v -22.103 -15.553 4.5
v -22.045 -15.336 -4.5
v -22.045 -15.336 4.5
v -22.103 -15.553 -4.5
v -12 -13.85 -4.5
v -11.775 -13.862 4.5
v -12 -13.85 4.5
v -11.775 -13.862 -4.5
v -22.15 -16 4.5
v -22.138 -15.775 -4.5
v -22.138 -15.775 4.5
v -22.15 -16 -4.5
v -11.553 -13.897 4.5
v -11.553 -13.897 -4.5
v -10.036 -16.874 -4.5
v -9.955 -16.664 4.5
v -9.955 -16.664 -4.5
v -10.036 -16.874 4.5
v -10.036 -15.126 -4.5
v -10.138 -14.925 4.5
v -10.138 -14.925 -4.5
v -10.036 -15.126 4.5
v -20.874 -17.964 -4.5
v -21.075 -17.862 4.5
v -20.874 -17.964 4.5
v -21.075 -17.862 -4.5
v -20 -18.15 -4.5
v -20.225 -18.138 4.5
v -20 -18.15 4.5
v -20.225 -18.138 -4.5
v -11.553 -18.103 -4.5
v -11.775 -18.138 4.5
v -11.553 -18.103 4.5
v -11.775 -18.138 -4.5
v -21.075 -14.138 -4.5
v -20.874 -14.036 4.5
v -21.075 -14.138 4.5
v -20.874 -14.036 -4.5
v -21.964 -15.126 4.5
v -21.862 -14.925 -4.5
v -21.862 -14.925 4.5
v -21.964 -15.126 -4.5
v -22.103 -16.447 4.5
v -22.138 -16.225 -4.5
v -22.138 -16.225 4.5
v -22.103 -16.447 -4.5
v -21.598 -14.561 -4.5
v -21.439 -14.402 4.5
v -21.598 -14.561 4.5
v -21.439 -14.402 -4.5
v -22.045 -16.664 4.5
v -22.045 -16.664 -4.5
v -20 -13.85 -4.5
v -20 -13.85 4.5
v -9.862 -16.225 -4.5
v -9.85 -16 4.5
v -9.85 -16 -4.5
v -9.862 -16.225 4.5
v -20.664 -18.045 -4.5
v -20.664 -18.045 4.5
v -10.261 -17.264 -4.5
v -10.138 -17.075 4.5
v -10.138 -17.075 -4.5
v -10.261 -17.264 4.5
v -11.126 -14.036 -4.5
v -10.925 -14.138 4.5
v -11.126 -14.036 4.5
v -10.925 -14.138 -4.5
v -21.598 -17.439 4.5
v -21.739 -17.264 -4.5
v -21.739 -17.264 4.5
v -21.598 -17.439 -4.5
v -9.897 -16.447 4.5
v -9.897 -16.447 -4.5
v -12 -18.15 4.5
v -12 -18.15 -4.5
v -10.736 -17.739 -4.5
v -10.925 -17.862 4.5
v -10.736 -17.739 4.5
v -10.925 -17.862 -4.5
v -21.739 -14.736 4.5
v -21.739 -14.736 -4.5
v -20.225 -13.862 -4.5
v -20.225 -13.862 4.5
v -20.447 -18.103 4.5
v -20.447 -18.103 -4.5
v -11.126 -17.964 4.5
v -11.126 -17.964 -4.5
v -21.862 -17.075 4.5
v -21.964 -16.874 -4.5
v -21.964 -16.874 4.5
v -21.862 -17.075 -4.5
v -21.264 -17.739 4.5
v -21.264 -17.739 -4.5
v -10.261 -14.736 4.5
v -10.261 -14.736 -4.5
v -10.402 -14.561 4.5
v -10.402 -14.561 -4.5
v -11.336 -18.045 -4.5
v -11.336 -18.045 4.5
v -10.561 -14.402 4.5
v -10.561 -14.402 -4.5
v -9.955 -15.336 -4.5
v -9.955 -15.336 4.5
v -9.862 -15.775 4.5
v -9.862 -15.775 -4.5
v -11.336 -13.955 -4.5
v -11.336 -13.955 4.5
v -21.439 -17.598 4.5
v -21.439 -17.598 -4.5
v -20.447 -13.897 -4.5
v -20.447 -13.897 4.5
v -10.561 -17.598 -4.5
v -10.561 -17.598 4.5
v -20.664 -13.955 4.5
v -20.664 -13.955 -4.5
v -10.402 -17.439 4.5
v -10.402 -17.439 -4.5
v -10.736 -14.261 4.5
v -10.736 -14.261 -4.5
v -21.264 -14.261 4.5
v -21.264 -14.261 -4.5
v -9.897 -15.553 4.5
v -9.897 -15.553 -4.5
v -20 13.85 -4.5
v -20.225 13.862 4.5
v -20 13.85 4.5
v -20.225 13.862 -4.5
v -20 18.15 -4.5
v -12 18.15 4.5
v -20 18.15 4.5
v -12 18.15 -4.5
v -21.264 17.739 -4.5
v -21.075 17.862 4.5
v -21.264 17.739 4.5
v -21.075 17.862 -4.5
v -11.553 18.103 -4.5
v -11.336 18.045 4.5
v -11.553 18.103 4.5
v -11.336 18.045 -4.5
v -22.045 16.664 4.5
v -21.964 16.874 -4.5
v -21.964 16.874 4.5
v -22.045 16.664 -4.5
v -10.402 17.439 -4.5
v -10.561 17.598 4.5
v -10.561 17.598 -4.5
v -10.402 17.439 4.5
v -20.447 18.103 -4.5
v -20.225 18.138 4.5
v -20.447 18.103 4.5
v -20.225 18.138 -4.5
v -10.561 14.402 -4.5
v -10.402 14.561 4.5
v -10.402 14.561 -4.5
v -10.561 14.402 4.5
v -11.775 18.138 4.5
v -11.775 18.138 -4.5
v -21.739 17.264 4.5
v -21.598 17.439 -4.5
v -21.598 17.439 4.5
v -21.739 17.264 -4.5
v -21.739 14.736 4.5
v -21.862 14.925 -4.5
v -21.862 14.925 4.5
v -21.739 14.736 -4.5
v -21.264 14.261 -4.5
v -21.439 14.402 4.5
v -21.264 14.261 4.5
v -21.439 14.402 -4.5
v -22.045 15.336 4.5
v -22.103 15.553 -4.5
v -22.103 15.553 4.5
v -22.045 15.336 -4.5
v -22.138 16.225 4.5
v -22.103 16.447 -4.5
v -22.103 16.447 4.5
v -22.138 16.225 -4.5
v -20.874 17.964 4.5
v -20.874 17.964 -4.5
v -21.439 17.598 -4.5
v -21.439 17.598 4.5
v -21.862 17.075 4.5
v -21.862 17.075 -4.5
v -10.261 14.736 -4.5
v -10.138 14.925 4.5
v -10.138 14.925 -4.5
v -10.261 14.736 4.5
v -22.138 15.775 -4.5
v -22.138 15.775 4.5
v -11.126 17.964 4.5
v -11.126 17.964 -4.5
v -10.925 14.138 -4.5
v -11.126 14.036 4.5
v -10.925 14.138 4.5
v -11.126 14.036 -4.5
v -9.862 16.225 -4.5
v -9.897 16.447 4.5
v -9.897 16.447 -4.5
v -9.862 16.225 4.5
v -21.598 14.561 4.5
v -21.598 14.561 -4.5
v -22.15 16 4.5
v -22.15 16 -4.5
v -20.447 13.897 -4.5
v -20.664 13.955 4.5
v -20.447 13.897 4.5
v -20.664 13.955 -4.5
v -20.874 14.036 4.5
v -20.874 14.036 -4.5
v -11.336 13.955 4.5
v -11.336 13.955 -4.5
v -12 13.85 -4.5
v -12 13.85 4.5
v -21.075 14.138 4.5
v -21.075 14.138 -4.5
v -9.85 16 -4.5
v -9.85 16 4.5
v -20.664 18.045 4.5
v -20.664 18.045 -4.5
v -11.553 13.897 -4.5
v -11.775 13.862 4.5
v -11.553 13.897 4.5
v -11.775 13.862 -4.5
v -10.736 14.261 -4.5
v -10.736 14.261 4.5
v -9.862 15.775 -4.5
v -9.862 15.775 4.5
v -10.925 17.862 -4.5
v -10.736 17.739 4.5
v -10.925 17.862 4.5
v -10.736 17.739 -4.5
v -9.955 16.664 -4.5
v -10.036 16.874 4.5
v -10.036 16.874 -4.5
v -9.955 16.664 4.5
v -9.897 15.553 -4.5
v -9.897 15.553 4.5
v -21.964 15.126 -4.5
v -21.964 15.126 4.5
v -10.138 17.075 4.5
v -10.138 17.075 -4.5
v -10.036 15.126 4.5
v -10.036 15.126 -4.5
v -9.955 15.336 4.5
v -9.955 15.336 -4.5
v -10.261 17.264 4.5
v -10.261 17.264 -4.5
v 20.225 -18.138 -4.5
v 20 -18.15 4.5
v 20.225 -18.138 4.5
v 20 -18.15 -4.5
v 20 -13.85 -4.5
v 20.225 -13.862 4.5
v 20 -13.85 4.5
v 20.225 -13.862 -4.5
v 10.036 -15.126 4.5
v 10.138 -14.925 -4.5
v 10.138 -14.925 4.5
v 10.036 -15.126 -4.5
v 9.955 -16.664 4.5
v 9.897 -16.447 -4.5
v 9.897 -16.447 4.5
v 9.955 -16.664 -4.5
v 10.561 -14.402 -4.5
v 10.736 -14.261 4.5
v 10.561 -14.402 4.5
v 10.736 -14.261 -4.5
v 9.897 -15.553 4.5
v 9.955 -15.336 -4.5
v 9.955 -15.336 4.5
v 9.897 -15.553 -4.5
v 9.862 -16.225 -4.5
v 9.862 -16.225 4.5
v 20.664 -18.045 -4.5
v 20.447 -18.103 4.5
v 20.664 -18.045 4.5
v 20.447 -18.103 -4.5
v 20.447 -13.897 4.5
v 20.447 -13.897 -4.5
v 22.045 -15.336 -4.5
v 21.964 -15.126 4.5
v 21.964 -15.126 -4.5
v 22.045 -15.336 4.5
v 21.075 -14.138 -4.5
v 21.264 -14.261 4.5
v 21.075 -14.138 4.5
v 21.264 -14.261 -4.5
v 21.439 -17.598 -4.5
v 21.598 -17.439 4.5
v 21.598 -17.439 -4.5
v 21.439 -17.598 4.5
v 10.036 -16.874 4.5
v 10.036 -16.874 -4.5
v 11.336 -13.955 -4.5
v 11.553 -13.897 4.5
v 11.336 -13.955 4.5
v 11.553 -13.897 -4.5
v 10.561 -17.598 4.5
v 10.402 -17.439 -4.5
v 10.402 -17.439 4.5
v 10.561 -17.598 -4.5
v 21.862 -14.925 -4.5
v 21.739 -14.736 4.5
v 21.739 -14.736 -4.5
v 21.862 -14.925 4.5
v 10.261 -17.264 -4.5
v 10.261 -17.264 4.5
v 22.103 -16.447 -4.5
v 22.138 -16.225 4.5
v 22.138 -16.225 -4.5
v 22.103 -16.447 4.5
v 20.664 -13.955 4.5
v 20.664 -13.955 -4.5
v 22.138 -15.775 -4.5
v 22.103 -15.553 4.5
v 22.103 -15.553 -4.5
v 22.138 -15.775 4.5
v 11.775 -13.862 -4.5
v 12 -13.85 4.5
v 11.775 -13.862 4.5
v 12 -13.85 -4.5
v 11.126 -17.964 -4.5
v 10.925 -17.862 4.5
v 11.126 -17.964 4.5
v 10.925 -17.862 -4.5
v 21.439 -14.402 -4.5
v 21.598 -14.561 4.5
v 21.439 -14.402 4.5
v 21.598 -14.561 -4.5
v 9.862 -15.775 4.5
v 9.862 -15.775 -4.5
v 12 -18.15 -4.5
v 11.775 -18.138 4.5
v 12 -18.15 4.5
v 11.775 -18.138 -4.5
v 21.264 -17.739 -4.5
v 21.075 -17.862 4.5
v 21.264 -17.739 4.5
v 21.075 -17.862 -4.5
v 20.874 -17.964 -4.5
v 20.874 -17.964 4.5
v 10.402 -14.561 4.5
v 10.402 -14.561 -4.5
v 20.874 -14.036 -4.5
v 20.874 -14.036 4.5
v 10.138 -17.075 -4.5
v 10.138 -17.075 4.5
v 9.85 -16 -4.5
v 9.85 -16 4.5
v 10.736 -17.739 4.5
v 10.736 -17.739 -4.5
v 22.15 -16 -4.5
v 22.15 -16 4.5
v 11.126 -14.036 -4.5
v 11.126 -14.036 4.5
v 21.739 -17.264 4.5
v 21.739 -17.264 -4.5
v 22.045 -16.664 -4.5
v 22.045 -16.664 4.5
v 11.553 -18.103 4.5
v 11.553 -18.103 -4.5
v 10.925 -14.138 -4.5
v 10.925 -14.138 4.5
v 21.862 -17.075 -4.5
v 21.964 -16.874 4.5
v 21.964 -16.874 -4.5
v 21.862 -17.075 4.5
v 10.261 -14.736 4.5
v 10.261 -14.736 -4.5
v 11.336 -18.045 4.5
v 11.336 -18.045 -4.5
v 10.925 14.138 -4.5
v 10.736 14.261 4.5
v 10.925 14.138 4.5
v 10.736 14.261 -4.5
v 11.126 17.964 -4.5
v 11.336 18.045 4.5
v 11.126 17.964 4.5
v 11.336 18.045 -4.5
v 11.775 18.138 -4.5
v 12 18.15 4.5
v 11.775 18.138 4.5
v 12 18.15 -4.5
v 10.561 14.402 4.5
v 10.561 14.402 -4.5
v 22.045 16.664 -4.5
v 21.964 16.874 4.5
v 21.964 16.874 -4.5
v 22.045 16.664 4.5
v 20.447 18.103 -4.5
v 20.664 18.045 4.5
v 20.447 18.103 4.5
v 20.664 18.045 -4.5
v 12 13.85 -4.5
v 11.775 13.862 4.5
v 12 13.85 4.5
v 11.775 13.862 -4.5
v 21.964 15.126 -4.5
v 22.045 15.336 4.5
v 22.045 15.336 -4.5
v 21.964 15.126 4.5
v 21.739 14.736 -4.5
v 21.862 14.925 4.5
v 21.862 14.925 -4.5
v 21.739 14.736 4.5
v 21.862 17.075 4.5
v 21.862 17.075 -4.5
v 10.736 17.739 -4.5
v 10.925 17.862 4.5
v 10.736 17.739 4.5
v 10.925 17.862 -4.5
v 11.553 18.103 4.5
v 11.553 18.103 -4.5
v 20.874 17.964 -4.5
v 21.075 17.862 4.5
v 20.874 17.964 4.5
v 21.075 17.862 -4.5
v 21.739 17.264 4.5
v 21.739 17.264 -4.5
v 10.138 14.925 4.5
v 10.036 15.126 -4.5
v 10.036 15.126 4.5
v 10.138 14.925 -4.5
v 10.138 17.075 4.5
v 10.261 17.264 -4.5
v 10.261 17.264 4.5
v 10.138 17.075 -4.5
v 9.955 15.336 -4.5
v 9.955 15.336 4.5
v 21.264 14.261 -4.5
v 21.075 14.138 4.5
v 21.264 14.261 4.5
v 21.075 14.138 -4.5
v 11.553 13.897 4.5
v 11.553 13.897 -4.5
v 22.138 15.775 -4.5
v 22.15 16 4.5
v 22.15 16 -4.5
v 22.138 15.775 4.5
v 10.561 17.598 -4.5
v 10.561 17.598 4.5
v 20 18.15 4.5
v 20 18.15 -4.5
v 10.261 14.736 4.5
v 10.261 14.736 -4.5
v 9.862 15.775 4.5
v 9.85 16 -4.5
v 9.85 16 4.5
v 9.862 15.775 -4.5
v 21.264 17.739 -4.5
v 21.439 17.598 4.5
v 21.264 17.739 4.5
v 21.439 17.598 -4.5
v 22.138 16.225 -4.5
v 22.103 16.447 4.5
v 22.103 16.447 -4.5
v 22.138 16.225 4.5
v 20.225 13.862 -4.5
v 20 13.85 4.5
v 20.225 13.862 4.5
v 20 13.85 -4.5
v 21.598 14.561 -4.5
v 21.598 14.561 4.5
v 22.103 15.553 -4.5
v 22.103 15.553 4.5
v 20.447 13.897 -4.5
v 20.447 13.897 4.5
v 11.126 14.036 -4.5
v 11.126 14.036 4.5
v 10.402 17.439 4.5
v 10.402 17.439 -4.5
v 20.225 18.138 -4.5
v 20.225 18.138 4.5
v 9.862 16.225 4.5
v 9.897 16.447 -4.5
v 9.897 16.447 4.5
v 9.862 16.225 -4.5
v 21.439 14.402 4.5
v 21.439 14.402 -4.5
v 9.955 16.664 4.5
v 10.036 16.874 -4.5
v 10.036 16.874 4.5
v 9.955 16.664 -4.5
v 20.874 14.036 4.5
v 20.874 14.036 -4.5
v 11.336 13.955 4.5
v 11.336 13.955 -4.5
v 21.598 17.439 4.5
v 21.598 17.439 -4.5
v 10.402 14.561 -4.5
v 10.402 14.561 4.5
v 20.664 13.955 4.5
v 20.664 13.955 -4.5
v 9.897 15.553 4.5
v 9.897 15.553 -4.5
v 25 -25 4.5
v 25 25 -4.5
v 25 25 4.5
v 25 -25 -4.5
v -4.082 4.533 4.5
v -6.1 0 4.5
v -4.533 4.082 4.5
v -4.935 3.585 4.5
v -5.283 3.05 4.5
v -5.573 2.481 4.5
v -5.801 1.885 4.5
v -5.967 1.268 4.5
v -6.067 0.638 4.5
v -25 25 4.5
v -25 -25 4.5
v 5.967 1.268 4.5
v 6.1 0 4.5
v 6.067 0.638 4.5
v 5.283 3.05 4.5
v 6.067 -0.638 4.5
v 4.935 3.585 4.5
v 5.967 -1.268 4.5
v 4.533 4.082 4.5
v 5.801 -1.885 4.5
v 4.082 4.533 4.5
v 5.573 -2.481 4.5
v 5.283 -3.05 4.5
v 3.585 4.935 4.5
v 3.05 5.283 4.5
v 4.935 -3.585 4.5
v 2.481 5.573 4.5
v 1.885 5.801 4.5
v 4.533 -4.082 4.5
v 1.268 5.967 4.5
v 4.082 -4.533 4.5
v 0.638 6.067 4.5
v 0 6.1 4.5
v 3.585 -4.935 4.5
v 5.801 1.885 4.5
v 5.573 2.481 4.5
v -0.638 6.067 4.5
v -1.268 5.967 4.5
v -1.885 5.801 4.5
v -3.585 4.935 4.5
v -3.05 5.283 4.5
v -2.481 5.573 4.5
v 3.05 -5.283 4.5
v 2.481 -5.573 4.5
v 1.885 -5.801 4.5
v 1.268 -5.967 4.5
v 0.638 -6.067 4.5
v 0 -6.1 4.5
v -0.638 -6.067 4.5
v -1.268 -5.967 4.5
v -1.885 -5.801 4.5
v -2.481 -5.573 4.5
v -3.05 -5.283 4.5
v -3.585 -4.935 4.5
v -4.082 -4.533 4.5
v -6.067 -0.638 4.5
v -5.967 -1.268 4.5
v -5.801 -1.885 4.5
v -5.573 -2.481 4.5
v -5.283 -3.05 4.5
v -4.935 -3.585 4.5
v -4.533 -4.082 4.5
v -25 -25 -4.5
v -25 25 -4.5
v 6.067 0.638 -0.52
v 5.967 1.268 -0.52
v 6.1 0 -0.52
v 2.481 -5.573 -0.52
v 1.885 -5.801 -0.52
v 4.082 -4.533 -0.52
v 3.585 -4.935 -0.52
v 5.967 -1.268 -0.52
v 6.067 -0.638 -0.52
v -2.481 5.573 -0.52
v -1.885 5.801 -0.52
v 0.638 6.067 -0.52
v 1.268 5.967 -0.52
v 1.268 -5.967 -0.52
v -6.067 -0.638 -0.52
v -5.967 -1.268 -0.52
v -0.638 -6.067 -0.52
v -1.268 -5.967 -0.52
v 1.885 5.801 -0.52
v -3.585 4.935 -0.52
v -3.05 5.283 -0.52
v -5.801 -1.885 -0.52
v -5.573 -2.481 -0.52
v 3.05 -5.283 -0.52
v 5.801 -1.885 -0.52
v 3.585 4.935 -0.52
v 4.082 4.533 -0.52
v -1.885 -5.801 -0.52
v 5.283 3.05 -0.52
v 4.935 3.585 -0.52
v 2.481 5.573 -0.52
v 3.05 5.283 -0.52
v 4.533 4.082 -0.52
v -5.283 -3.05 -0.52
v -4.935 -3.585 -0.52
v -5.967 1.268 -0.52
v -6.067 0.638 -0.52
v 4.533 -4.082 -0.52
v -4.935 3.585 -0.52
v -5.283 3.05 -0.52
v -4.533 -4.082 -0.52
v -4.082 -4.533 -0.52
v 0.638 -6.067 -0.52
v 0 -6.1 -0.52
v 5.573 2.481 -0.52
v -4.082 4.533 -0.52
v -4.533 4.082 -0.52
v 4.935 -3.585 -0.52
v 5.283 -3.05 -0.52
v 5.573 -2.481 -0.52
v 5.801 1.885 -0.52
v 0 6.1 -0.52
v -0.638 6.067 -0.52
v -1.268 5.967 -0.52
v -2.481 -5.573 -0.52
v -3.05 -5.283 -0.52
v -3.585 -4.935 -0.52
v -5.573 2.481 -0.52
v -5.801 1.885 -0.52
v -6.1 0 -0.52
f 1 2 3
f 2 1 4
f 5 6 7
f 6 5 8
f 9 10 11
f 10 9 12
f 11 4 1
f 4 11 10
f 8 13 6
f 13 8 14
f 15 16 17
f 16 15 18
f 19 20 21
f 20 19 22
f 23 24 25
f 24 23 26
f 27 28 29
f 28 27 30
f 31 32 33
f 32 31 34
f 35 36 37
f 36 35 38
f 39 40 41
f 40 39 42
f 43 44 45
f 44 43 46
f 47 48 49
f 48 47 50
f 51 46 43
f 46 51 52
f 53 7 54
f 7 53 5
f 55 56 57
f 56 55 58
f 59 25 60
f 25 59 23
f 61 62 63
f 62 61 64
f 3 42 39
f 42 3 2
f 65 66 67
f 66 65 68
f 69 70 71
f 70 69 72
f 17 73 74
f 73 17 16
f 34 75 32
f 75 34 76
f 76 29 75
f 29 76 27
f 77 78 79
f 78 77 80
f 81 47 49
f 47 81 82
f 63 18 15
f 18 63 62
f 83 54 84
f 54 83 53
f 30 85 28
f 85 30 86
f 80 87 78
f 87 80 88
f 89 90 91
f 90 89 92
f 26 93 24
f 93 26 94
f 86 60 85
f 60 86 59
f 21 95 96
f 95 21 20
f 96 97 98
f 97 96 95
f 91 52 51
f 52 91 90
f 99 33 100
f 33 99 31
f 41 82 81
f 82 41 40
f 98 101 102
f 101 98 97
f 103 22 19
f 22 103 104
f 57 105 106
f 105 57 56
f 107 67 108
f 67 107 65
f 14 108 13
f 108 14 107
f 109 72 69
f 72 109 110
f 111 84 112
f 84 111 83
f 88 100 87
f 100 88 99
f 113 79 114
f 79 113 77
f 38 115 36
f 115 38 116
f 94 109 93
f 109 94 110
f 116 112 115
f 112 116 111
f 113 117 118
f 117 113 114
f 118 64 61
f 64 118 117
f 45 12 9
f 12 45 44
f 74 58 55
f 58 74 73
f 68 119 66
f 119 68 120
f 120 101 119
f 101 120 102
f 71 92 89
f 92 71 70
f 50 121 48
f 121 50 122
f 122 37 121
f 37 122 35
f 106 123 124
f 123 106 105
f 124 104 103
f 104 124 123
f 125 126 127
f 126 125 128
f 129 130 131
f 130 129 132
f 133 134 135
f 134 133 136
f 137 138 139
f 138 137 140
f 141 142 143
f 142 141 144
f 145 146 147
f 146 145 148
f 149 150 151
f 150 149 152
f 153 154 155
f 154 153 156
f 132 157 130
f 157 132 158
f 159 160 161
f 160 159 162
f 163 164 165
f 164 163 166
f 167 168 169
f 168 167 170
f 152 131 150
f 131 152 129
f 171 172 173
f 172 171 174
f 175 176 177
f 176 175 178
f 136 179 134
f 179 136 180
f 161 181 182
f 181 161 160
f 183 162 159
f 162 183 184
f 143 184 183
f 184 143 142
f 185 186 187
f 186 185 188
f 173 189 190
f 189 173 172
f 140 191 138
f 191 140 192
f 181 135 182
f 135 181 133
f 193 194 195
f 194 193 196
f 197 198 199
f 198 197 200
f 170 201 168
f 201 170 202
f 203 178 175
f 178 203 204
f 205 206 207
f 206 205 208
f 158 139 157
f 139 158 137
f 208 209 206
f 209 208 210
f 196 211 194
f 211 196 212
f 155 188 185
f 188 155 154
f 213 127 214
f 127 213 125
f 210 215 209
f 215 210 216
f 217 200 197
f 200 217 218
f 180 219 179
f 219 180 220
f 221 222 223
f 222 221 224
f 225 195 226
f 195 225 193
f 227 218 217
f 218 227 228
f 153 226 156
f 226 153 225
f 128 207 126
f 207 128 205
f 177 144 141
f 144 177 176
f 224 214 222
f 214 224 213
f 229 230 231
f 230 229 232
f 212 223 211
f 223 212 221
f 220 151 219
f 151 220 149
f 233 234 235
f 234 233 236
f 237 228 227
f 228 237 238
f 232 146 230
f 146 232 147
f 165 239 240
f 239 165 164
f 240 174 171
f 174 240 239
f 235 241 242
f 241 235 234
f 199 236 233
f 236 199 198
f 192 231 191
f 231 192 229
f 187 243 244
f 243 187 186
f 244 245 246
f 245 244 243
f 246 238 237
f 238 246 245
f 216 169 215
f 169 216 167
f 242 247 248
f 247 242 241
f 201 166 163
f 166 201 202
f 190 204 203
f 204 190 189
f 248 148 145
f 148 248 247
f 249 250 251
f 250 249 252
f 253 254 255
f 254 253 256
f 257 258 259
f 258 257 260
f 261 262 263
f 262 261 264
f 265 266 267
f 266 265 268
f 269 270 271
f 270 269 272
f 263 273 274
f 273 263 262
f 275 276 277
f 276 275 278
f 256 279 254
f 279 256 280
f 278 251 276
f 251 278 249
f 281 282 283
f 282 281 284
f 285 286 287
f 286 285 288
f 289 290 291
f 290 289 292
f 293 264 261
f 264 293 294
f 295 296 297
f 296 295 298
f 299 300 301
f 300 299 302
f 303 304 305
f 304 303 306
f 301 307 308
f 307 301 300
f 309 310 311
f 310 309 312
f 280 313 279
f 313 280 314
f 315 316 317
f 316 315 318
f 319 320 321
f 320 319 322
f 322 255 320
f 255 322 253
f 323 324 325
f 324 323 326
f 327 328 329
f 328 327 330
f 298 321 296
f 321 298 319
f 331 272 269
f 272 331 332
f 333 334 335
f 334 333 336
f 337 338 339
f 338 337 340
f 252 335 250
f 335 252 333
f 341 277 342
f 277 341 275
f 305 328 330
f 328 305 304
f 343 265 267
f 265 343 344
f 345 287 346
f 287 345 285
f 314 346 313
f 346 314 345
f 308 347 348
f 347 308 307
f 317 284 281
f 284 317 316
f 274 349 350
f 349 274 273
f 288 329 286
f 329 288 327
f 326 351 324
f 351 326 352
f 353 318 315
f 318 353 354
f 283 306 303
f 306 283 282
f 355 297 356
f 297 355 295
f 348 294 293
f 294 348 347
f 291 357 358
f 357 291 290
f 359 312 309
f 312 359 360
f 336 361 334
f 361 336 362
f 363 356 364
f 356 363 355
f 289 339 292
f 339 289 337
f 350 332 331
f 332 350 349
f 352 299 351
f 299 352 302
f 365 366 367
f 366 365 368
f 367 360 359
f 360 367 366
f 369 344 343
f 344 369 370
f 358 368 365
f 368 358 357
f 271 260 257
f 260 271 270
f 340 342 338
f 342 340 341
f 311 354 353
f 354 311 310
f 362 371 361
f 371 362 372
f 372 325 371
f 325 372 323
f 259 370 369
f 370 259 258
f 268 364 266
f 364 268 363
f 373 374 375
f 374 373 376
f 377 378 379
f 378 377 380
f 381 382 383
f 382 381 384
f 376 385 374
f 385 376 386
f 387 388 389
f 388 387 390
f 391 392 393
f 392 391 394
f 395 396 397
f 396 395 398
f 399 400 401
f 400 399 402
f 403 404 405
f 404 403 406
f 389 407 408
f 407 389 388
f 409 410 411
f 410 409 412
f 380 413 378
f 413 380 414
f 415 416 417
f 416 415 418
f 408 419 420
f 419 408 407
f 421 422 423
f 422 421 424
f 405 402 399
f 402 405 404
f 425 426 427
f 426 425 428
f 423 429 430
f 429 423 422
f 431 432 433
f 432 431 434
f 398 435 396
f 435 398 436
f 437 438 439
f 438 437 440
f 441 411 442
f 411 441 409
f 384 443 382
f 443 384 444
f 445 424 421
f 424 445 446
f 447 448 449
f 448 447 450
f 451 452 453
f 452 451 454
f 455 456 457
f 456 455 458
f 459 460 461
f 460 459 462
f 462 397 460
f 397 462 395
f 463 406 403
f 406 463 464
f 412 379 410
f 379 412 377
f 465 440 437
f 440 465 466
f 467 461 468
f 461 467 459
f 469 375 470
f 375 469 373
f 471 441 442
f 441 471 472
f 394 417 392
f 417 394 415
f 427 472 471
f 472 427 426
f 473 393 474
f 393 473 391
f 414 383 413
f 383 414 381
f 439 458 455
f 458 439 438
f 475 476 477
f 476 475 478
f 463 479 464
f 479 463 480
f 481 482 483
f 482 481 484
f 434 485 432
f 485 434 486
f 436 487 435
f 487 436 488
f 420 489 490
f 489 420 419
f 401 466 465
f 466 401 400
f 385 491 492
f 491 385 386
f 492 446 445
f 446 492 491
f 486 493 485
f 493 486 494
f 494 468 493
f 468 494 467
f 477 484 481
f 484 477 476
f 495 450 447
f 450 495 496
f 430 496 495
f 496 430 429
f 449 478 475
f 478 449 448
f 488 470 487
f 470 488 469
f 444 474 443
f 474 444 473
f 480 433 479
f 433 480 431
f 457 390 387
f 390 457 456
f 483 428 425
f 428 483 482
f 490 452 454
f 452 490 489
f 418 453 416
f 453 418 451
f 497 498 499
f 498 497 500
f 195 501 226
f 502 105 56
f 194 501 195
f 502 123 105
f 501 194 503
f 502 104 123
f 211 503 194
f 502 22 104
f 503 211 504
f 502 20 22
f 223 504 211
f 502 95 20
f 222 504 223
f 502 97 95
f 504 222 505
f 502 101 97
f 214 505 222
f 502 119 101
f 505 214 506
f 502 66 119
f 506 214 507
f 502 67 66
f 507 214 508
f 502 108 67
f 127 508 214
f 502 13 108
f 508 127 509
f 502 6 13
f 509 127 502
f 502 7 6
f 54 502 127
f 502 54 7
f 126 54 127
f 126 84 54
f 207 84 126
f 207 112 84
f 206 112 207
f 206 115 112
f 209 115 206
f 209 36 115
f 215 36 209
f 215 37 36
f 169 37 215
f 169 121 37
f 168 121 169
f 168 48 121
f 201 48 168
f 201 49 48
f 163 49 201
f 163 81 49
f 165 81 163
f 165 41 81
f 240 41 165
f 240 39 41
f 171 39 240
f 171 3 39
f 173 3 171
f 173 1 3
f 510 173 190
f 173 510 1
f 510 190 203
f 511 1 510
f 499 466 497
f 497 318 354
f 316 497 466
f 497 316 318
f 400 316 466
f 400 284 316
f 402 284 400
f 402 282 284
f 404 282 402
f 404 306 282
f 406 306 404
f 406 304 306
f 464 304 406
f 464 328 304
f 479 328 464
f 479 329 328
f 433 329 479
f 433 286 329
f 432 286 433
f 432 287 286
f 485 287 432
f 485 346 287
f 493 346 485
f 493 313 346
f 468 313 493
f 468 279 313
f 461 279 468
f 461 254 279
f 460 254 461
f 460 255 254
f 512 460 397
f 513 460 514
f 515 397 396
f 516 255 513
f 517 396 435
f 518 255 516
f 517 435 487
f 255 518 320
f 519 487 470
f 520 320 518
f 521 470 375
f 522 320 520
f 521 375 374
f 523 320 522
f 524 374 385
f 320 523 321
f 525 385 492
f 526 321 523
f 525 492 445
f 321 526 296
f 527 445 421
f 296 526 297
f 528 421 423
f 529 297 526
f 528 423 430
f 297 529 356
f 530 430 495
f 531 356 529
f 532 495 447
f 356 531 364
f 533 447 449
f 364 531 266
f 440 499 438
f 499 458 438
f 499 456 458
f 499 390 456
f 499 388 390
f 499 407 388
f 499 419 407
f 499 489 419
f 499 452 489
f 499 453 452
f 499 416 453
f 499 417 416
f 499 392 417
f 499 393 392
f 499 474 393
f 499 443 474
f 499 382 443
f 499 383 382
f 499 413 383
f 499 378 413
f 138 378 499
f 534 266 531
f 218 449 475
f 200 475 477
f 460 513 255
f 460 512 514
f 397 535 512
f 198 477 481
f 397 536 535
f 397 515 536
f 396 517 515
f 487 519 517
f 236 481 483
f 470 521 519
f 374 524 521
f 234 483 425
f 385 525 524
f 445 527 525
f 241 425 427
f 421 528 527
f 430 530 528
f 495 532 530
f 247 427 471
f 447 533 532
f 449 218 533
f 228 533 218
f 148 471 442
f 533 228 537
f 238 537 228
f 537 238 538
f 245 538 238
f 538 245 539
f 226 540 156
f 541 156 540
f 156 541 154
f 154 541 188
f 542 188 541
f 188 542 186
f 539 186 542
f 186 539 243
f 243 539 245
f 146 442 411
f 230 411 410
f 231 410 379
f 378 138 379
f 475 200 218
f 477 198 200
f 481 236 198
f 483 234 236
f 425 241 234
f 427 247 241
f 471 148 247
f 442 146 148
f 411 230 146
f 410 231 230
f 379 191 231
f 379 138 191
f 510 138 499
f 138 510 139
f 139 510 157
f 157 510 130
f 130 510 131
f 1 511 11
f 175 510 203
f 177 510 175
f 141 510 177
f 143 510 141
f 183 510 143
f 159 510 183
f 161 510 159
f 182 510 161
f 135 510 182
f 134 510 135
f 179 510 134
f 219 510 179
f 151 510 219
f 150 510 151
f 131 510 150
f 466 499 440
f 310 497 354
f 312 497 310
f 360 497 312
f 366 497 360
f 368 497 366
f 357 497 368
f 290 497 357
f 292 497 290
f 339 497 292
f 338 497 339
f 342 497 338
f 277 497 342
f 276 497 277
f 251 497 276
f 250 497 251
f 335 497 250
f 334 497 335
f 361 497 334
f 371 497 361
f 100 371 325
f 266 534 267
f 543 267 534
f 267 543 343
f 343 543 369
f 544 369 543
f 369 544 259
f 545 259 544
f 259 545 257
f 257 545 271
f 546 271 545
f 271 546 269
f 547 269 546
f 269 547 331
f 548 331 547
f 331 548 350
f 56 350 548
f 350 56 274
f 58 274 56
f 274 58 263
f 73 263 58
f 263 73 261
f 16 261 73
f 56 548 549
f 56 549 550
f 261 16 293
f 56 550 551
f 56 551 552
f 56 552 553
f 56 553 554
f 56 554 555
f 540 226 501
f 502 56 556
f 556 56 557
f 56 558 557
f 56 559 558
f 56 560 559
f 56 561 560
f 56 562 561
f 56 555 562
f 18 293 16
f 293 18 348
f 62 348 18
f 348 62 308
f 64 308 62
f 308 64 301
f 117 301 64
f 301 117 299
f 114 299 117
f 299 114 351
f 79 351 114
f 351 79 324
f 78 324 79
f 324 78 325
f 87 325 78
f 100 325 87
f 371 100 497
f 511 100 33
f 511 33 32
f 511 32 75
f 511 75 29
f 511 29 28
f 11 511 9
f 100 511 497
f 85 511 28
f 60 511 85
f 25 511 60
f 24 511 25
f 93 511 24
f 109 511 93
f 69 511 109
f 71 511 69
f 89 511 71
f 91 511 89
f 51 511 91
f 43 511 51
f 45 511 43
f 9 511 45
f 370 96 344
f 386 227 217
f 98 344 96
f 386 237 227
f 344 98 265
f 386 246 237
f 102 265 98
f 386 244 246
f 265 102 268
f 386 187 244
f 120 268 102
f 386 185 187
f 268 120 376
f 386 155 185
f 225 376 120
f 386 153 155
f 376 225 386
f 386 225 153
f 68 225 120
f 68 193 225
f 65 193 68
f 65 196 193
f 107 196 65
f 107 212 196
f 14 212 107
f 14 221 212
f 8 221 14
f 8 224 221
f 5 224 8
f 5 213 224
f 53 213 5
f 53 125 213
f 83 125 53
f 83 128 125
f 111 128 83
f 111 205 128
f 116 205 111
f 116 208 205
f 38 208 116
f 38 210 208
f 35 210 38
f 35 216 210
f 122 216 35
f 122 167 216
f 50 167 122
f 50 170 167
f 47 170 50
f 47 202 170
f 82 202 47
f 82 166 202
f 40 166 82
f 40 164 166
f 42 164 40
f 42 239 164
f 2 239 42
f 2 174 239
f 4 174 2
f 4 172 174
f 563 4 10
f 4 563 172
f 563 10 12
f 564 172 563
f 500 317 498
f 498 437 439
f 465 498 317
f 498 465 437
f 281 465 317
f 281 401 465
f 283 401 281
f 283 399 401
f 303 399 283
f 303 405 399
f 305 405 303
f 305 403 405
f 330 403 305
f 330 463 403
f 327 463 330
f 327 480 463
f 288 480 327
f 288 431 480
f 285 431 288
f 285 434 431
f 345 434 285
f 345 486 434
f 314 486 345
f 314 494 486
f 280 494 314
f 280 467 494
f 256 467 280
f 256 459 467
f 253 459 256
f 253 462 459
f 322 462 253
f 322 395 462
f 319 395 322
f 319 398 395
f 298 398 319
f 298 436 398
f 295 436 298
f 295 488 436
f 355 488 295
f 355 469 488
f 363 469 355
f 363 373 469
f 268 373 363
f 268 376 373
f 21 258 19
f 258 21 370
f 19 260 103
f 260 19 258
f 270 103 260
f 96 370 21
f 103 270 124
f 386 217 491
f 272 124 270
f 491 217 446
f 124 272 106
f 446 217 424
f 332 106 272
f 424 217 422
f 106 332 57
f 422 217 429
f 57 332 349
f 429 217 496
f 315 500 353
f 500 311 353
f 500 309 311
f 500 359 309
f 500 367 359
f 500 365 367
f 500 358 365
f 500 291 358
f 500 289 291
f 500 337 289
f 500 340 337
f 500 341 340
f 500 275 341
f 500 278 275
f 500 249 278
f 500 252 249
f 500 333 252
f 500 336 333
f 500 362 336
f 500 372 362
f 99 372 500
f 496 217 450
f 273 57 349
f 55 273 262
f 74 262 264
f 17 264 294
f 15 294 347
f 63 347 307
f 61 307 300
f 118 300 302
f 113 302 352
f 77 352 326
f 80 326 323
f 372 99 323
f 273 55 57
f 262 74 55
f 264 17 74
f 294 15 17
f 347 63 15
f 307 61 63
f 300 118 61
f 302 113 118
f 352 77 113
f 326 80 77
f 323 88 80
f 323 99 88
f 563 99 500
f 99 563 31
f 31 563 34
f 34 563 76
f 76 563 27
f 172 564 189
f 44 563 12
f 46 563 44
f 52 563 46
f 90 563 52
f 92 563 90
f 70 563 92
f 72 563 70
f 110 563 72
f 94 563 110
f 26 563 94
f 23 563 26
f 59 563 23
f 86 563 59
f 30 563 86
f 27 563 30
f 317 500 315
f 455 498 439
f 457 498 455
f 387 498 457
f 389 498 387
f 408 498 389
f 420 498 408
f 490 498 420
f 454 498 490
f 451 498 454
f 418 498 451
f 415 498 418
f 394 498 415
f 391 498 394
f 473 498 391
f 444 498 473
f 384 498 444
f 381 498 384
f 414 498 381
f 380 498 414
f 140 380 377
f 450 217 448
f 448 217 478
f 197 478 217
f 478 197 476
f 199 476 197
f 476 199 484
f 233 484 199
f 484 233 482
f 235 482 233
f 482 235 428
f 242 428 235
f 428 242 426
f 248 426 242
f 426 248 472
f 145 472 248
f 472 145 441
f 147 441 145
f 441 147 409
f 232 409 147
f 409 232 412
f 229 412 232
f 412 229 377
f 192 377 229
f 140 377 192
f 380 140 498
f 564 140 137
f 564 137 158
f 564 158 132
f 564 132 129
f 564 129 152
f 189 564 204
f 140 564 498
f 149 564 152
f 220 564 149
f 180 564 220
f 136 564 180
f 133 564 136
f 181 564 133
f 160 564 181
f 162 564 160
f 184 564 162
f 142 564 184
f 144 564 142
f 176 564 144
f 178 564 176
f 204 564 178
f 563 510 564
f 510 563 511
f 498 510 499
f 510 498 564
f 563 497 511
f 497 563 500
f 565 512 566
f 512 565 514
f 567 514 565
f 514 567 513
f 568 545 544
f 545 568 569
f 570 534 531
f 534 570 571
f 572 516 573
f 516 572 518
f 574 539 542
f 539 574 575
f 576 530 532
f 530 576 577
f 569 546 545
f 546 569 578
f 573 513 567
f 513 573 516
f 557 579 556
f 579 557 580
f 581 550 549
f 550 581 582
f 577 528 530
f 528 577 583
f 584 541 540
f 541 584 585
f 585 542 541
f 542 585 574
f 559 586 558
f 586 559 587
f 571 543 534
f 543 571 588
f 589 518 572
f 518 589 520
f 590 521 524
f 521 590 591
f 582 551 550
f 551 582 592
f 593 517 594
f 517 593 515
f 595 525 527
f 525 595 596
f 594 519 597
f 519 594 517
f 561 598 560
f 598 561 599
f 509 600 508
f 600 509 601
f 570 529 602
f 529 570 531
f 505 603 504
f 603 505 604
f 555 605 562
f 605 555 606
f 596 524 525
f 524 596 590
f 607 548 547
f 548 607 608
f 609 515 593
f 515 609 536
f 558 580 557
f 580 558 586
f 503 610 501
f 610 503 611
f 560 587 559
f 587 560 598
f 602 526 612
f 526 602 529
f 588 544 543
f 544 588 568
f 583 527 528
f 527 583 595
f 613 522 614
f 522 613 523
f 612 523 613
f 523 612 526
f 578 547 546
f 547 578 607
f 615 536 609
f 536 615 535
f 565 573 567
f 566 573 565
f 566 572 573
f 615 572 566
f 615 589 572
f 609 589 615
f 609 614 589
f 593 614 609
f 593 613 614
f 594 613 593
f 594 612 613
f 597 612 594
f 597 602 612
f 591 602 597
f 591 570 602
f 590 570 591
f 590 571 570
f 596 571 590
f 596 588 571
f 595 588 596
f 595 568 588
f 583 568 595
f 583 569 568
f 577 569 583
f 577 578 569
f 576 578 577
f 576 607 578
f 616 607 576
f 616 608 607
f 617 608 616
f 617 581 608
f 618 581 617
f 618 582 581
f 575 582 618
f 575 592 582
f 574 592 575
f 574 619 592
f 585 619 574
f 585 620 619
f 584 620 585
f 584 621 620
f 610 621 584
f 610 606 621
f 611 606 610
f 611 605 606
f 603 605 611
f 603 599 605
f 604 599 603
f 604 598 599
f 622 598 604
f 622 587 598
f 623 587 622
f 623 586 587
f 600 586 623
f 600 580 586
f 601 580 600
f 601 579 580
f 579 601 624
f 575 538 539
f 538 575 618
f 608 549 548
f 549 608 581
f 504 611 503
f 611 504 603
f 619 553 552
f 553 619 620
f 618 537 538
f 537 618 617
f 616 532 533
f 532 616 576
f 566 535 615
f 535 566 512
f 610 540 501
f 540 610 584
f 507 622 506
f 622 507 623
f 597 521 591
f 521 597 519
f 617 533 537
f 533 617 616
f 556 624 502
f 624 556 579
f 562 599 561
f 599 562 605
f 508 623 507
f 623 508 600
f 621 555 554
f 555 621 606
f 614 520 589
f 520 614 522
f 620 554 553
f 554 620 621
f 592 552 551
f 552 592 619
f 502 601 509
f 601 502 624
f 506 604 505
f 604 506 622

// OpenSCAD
// Bearing mounting plate with 12.2 mm pocket.
$fn = 60;
eps = 0.02;
plate_w = 50;
plate_t = 9;
bearing_d = 12.2;
pocket_d = 5;
mount_pitch = 32;
module slot(x, y) {
    hull() {
        translate([x - 4, y, -plate_t / 2 - eps]) cylinder(d = 4.3, h = plate_t + 2 * eps);
        translate([x + 4, y, -plate_t / 2 - eps]) cylinder(d = 4.3, h = plate_t + 2 * eps);
    }
}
difference() {
    cube([plate_w, plate_w, plate_t], center = true);
    translate([0, 0, plate_t / 2 - pocket_d - eps]) cylinder(d = bearing_d, h = pocket_d + 2 * eps);
    for (x = [-mount_pitch / 2, mount_pitch / 2], y = [-mount_pitch / 2, mount_pitch / 2]) slot(x, y);
}
